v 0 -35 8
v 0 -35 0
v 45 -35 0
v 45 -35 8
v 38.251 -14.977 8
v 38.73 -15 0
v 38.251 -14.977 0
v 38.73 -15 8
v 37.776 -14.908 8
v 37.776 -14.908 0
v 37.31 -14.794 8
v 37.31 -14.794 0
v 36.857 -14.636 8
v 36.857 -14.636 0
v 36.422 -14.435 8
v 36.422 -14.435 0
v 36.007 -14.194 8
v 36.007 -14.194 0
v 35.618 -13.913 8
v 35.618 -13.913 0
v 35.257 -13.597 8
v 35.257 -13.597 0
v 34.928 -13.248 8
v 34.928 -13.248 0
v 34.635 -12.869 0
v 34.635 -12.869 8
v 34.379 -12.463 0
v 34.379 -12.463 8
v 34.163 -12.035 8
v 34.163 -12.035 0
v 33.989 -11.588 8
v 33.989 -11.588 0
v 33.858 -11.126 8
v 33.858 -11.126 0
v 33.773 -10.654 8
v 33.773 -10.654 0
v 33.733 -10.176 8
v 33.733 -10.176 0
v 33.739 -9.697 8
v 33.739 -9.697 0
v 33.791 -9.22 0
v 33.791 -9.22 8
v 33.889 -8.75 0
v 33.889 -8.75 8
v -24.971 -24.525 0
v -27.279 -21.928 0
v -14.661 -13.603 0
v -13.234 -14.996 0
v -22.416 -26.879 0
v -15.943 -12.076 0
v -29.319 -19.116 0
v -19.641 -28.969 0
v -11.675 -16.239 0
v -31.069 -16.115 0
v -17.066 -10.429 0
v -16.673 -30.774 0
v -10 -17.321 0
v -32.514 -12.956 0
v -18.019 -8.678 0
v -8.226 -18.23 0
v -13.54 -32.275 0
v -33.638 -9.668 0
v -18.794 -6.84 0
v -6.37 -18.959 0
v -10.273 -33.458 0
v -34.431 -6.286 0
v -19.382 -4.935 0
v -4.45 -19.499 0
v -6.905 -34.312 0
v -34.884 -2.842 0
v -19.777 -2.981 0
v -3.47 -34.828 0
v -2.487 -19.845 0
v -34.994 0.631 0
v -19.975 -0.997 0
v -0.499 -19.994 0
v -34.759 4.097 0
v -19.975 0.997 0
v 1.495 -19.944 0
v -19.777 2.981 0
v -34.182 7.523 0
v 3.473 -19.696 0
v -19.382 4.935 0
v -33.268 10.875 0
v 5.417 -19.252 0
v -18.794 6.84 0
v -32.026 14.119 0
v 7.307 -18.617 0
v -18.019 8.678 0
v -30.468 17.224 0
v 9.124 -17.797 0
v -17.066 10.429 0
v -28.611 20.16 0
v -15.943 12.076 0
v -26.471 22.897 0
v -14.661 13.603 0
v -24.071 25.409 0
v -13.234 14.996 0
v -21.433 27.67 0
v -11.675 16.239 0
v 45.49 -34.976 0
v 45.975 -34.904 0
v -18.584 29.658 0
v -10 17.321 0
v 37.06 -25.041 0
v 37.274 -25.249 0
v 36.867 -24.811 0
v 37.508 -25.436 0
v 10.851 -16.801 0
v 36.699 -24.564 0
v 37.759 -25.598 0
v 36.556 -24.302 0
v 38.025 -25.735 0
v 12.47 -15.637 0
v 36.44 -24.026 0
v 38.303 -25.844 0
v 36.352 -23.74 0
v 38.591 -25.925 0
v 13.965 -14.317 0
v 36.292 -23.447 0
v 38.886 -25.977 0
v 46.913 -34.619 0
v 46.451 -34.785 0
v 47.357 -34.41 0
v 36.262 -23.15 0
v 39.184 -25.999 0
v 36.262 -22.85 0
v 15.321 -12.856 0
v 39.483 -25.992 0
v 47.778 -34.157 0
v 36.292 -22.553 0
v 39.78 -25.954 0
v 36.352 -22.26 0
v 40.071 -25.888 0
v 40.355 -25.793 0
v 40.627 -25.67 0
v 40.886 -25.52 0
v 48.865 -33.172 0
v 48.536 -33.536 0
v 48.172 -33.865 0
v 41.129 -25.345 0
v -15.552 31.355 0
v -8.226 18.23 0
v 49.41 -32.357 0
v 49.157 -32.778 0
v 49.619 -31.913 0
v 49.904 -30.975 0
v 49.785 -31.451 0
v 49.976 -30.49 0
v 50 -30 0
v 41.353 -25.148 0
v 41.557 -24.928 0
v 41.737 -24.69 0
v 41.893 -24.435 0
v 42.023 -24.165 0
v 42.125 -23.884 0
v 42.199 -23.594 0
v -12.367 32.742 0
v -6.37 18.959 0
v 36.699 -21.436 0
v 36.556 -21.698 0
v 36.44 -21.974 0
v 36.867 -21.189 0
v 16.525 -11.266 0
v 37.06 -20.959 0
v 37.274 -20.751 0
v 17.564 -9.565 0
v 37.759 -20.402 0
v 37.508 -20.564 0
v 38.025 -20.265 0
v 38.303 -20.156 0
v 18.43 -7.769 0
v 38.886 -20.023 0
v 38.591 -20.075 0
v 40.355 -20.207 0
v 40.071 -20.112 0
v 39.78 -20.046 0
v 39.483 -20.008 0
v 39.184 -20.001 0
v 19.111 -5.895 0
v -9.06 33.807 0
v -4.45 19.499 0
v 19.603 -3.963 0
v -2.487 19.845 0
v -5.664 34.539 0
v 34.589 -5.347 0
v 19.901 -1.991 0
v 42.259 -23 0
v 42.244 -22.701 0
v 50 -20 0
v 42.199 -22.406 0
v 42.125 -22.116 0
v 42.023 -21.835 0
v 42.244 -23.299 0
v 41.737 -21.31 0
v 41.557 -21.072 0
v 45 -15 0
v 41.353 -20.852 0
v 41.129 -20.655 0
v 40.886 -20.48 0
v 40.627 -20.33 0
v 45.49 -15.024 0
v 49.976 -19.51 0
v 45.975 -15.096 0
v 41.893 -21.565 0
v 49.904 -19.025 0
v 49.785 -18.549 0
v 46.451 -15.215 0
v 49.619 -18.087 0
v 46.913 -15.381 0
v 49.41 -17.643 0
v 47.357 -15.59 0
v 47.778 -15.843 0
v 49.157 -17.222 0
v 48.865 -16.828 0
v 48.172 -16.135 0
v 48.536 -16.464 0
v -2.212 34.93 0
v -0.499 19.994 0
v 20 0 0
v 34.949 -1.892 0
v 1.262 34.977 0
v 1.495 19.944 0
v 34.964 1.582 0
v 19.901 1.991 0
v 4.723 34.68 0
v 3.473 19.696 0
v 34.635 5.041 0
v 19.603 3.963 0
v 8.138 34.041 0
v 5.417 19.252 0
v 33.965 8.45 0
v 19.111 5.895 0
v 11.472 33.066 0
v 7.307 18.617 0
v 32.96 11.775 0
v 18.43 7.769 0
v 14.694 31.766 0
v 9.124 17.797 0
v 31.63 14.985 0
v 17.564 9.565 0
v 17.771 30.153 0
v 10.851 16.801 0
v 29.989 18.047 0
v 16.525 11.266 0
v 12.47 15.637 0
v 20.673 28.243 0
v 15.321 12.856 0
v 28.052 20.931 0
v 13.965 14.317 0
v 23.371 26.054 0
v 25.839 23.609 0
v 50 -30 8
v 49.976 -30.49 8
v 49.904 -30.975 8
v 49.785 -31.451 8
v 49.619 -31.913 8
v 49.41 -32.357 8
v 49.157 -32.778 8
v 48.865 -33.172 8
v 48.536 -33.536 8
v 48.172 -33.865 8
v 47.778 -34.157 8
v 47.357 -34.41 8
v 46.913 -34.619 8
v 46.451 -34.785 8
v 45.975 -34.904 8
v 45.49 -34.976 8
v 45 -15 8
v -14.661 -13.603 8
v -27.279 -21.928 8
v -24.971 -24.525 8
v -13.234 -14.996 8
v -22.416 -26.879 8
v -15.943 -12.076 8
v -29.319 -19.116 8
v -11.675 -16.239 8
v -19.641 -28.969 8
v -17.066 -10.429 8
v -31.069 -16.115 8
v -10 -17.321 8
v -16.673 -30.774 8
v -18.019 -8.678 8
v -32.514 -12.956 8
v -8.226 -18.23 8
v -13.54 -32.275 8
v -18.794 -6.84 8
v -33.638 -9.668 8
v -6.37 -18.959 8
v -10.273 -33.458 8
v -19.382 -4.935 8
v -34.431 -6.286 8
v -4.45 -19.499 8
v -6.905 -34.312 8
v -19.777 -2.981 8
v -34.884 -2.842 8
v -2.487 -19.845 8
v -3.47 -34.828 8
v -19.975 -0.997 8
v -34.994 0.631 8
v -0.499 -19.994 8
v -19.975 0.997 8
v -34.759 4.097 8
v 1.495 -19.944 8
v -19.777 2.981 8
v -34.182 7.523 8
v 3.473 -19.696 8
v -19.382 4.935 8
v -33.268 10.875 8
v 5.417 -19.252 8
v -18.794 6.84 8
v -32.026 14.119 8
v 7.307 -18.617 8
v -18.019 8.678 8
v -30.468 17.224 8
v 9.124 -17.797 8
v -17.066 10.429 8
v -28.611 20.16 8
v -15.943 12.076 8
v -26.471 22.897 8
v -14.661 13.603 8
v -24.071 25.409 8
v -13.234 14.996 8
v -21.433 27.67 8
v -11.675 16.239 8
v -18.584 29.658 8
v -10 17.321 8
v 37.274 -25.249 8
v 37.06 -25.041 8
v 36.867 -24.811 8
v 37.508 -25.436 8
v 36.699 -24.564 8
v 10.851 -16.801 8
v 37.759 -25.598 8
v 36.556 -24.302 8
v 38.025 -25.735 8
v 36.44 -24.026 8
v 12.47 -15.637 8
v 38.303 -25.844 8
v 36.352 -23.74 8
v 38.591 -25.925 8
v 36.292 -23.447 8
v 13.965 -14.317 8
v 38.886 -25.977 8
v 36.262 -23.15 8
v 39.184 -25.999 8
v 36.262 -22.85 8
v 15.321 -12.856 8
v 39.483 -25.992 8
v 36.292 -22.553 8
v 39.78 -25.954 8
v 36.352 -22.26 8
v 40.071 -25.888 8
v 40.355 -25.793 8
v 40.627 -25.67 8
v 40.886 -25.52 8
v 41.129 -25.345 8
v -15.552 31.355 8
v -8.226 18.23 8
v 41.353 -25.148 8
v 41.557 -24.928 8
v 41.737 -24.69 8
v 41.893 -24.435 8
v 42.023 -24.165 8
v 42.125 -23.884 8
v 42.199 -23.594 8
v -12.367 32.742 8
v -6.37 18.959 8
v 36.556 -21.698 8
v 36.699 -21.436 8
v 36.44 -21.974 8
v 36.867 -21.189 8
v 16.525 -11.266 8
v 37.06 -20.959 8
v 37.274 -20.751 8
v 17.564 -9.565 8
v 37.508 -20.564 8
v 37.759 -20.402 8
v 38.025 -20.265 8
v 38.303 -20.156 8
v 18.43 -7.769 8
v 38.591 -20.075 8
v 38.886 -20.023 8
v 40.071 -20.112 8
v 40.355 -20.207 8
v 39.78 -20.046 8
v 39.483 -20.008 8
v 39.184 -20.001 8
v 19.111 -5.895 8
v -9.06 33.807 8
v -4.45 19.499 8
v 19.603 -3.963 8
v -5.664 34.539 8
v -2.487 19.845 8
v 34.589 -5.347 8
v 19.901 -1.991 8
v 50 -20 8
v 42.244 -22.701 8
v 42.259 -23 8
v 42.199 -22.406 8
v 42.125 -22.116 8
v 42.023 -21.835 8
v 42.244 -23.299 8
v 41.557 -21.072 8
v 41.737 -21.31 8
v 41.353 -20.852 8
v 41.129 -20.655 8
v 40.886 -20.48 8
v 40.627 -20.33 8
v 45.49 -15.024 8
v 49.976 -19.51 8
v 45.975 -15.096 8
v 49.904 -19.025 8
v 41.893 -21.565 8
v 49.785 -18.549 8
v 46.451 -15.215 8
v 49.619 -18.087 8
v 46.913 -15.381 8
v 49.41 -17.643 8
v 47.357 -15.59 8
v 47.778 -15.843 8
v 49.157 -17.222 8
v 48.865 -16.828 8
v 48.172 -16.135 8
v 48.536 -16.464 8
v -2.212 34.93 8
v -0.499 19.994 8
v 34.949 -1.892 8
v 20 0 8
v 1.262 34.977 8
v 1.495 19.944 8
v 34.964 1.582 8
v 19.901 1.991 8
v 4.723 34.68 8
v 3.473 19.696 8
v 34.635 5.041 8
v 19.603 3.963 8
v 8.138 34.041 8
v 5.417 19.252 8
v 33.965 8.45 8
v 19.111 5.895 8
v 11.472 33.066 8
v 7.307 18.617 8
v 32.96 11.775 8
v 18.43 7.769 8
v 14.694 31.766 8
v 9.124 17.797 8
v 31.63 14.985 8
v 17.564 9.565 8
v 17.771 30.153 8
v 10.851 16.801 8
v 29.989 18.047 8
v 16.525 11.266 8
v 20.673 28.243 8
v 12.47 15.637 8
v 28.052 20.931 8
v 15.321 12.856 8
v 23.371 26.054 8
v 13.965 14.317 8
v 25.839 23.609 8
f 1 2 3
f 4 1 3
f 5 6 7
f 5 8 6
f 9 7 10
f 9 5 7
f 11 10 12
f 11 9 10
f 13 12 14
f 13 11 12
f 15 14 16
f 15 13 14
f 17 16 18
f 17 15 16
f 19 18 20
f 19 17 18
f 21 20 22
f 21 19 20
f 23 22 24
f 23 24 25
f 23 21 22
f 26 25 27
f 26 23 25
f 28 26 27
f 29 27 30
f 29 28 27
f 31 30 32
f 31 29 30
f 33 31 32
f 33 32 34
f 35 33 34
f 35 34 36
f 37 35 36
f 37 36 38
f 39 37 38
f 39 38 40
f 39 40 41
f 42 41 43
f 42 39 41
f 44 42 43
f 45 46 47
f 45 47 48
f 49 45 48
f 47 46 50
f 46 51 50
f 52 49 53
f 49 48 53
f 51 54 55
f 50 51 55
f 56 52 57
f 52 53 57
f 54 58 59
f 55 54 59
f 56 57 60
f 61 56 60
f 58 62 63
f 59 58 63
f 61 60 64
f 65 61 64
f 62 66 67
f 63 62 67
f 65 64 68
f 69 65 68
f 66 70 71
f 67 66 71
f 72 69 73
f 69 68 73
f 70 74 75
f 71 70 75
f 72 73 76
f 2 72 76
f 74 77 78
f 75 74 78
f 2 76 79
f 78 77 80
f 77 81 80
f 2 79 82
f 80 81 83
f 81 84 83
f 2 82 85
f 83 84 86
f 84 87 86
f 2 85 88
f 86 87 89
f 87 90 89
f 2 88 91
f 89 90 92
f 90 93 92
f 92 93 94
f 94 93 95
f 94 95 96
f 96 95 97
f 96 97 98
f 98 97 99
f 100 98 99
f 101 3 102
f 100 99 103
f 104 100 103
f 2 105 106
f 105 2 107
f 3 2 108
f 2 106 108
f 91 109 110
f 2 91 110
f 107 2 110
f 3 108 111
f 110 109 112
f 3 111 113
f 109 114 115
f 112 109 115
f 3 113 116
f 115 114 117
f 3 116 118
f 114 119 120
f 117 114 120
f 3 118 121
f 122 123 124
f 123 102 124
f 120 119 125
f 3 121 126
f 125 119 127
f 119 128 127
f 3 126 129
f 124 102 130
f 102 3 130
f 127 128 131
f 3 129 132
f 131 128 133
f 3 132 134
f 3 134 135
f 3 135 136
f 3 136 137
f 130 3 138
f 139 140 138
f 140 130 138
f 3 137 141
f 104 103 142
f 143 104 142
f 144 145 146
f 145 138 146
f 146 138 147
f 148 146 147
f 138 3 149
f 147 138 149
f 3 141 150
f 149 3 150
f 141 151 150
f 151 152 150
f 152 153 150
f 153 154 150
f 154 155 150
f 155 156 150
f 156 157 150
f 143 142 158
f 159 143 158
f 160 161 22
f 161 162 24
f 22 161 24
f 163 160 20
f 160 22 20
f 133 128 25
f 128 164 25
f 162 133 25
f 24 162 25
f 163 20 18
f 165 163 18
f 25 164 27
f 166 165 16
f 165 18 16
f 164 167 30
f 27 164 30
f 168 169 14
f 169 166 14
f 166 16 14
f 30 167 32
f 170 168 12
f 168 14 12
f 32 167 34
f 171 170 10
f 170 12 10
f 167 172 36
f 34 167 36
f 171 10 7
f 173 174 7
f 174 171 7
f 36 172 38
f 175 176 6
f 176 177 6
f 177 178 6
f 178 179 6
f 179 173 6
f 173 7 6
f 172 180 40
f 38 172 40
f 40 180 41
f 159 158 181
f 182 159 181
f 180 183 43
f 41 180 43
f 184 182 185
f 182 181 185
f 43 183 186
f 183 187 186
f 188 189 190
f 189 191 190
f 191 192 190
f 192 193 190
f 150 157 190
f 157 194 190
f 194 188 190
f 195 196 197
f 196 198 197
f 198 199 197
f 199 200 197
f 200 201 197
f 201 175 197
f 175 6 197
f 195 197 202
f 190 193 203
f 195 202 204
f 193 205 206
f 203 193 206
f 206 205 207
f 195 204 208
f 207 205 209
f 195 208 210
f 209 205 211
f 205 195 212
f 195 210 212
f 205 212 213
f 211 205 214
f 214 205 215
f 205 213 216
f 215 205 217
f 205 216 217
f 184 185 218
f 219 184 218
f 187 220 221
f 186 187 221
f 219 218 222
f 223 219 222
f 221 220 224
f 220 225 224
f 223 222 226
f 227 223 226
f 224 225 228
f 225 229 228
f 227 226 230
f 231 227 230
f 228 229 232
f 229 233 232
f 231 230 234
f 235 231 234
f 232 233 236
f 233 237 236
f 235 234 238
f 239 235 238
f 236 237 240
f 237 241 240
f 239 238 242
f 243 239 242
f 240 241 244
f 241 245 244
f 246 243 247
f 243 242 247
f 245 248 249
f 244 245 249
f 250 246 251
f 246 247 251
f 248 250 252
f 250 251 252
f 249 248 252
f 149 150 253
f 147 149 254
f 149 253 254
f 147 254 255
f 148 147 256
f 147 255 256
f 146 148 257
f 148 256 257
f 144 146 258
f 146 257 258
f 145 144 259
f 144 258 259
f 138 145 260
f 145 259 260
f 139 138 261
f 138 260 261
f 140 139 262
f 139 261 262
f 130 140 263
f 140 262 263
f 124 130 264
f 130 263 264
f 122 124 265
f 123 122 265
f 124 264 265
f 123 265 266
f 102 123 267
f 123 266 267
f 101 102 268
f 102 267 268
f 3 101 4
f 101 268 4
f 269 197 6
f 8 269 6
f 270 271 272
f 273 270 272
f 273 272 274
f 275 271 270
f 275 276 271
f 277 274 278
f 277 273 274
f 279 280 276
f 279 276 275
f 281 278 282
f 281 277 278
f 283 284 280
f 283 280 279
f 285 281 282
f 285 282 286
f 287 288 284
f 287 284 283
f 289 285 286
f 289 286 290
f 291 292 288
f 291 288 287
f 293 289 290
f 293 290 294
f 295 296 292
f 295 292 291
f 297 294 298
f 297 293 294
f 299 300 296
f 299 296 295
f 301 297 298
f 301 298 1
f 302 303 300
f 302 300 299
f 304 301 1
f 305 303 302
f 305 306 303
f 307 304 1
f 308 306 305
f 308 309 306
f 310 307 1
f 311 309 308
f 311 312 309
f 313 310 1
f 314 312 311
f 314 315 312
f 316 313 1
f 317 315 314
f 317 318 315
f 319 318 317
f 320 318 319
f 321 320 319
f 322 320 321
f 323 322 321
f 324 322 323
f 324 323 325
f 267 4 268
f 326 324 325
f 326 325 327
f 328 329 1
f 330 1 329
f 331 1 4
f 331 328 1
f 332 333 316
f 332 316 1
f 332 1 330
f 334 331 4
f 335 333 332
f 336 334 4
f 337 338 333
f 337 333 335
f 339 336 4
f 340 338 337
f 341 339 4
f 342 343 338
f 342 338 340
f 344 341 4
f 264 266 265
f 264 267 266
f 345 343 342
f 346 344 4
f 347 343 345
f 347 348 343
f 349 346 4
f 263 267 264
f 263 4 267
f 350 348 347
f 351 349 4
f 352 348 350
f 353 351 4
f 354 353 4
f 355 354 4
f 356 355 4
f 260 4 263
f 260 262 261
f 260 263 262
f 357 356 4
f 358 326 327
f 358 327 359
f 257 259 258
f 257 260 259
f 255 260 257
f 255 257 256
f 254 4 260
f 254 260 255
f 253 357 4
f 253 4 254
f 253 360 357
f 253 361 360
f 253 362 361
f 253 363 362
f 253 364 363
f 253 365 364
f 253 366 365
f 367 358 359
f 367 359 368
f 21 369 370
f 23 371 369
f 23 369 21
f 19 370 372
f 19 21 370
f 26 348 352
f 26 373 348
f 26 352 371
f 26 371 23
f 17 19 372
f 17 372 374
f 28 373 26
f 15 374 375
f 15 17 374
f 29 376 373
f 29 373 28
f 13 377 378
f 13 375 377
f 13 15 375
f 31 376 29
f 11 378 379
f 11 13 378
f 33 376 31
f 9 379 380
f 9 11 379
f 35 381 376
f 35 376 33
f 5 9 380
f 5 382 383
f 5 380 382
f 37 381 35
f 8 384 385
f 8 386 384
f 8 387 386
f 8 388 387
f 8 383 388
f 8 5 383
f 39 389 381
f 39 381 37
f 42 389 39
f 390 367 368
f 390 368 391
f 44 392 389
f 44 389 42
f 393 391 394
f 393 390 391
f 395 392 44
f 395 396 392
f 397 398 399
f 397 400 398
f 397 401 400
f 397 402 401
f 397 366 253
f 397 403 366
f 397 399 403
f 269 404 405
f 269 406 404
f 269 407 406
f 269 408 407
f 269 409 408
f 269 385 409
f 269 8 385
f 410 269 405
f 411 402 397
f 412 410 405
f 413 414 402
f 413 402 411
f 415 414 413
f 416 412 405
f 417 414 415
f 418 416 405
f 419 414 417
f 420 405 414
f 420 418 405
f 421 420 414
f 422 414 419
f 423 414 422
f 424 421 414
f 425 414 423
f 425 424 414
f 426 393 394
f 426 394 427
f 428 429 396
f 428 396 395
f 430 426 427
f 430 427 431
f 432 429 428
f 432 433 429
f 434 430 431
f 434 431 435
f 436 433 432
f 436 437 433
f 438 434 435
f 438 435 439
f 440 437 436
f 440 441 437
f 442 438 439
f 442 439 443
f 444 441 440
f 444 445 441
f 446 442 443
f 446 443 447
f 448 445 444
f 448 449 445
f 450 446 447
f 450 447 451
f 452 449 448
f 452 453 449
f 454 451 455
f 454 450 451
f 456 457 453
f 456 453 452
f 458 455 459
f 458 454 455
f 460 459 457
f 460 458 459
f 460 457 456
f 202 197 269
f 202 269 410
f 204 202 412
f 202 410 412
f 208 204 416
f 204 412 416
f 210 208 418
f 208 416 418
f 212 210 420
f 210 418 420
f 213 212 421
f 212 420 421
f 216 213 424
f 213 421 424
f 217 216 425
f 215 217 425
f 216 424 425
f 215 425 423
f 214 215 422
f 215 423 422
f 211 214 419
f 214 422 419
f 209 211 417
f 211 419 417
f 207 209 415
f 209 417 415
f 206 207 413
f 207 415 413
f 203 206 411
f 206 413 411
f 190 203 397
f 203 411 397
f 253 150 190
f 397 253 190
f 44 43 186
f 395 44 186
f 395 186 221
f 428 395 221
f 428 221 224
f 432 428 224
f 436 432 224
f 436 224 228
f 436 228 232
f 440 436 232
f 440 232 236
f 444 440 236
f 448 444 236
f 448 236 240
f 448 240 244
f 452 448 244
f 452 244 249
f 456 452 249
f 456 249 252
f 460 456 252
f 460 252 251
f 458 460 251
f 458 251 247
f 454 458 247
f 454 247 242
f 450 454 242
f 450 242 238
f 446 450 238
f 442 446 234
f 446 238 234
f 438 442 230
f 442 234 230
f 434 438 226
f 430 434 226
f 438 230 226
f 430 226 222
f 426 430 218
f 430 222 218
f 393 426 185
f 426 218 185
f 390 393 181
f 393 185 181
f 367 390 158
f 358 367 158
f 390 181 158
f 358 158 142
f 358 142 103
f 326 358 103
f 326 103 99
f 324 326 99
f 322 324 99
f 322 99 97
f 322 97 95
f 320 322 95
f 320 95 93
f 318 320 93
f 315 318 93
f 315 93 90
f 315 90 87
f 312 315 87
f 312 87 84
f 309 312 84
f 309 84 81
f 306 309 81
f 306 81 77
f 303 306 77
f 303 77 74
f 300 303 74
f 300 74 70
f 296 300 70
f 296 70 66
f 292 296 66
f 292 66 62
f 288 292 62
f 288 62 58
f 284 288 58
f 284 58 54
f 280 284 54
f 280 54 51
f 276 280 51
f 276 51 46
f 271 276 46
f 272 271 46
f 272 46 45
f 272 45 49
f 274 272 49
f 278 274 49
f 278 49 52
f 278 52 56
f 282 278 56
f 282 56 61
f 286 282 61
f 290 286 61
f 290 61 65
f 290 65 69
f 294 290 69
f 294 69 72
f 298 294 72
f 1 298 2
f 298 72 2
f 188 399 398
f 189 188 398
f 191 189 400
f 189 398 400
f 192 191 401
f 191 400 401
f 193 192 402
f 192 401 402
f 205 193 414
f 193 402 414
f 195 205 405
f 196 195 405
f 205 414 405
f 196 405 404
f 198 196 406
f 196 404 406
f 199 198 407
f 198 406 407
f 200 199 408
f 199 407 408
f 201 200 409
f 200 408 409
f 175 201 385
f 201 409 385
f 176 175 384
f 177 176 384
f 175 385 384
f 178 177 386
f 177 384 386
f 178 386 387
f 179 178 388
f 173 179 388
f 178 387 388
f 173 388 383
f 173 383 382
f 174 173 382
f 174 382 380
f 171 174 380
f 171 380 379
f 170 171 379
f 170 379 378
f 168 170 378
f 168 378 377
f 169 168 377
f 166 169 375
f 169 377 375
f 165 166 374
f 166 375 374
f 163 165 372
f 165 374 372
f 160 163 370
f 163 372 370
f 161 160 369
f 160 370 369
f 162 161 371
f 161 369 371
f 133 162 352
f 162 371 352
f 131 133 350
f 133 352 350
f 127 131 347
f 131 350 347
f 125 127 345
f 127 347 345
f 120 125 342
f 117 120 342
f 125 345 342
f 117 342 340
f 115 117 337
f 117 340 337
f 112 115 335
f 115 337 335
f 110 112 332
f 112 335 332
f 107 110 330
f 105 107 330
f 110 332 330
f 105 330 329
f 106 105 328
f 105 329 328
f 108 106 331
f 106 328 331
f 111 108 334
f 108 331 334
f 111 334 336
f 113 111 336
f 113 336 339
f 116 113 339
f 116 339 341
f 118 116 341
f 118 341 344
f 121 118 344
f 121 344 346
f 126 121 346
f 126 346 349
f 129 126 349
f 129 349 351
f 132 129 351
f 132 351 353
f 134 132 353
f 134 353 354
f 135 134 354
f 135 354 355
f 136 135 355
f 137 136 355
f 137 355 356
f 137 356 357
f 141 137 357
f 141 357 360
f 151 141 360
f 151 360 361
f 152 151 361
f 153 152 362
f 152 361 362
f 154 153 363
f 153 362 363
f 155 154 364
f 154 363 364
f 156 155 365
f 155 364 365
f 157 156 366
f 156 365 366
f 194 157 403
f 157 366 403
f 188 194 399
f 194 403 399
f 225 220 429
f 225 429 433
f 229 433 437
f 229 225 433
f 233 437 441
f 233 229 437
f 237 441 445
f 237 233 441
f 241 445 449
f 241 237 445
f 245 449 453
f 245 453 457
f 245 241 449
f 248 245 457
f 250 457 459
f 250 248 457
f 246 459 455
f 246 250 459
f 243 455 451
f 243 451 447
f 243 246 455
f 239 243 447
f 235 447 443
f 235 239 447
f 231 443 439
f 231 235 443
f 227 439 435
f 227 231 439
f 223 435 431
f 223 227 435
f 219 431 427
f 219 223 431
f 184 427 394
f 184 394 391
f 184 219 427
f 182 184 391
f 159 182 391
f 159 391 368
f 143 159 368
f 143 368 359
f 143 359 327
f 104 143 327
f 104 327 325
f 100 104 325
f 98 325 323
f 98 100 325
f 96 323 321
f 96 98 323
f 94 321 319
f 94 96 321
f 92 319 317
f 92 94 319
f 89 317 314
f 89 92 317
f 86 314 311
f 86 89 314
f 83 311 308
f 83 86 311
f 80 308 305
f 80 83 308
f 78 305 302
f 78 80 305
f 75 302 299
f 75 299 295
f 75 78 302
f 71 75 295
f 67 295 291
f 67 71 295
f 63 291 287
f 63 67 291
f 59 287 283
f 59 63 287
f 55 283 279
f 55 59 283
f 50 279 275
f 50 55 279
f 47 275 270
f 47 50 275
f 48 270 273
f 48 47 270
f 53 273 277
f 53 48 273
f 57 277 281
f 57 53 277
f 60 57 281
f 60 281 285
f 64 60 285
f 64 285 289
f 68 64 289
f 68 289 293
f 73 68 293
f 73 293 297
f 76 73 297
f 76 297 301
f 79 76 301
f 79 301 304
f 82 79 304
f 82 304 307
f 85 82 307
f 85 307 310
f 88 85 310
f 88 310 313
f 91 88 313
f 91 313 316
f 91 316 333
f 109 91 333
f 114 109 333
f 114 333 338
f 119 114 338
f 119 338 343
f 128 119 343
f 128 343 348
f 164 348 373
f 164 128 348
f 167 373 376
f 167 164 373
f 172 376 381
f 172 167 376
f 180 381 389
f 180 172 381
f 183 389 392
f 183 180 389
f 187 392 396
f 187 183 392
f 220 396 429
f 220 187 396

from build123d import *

# Parameters (mm, degrees)
F0_R     = 20
F1_DEPTH = 8
F2_R     = 5
F3_R     = 3
F4_DEPTH = 8


with BuildPart() as f1:
    # F0 (on Top) → F1 (new body)
    with BuildSketch(Plane.XY):
        with BuildLine():
            Line((50, -15), (31.622777, -15))
            ThreePointArc((31.622777, -15), (-18.708287, 29.580399), (0, -35))
            Line((0, -35), (50, -35))
            Line((50, -35), (50, -15))
        make_face()
        Circle(F0_R, mode=Mode.SUBTRACT)
    extrude(amount=F1_DEPTH)

    # F2
    f2_edges = [f1.edges().sort_by_distance(p)[0] for p in [
        (31.622777, -15, 4),
        (50, -15, 4),
        (50, -35, 4),
    ]]
    fillet(f2_edges, radius=F2_R)

    # F3 (on face) → F4 (cut, through all)
    with BuildSketch(Plane.XY.offset(8)):
        with Locations((39.258757, -23)):
            Circle(F3_R)
    extrude(amount=-F4_DEPTH, mode=Mode.SUBTRACT)


solid = f1.part
